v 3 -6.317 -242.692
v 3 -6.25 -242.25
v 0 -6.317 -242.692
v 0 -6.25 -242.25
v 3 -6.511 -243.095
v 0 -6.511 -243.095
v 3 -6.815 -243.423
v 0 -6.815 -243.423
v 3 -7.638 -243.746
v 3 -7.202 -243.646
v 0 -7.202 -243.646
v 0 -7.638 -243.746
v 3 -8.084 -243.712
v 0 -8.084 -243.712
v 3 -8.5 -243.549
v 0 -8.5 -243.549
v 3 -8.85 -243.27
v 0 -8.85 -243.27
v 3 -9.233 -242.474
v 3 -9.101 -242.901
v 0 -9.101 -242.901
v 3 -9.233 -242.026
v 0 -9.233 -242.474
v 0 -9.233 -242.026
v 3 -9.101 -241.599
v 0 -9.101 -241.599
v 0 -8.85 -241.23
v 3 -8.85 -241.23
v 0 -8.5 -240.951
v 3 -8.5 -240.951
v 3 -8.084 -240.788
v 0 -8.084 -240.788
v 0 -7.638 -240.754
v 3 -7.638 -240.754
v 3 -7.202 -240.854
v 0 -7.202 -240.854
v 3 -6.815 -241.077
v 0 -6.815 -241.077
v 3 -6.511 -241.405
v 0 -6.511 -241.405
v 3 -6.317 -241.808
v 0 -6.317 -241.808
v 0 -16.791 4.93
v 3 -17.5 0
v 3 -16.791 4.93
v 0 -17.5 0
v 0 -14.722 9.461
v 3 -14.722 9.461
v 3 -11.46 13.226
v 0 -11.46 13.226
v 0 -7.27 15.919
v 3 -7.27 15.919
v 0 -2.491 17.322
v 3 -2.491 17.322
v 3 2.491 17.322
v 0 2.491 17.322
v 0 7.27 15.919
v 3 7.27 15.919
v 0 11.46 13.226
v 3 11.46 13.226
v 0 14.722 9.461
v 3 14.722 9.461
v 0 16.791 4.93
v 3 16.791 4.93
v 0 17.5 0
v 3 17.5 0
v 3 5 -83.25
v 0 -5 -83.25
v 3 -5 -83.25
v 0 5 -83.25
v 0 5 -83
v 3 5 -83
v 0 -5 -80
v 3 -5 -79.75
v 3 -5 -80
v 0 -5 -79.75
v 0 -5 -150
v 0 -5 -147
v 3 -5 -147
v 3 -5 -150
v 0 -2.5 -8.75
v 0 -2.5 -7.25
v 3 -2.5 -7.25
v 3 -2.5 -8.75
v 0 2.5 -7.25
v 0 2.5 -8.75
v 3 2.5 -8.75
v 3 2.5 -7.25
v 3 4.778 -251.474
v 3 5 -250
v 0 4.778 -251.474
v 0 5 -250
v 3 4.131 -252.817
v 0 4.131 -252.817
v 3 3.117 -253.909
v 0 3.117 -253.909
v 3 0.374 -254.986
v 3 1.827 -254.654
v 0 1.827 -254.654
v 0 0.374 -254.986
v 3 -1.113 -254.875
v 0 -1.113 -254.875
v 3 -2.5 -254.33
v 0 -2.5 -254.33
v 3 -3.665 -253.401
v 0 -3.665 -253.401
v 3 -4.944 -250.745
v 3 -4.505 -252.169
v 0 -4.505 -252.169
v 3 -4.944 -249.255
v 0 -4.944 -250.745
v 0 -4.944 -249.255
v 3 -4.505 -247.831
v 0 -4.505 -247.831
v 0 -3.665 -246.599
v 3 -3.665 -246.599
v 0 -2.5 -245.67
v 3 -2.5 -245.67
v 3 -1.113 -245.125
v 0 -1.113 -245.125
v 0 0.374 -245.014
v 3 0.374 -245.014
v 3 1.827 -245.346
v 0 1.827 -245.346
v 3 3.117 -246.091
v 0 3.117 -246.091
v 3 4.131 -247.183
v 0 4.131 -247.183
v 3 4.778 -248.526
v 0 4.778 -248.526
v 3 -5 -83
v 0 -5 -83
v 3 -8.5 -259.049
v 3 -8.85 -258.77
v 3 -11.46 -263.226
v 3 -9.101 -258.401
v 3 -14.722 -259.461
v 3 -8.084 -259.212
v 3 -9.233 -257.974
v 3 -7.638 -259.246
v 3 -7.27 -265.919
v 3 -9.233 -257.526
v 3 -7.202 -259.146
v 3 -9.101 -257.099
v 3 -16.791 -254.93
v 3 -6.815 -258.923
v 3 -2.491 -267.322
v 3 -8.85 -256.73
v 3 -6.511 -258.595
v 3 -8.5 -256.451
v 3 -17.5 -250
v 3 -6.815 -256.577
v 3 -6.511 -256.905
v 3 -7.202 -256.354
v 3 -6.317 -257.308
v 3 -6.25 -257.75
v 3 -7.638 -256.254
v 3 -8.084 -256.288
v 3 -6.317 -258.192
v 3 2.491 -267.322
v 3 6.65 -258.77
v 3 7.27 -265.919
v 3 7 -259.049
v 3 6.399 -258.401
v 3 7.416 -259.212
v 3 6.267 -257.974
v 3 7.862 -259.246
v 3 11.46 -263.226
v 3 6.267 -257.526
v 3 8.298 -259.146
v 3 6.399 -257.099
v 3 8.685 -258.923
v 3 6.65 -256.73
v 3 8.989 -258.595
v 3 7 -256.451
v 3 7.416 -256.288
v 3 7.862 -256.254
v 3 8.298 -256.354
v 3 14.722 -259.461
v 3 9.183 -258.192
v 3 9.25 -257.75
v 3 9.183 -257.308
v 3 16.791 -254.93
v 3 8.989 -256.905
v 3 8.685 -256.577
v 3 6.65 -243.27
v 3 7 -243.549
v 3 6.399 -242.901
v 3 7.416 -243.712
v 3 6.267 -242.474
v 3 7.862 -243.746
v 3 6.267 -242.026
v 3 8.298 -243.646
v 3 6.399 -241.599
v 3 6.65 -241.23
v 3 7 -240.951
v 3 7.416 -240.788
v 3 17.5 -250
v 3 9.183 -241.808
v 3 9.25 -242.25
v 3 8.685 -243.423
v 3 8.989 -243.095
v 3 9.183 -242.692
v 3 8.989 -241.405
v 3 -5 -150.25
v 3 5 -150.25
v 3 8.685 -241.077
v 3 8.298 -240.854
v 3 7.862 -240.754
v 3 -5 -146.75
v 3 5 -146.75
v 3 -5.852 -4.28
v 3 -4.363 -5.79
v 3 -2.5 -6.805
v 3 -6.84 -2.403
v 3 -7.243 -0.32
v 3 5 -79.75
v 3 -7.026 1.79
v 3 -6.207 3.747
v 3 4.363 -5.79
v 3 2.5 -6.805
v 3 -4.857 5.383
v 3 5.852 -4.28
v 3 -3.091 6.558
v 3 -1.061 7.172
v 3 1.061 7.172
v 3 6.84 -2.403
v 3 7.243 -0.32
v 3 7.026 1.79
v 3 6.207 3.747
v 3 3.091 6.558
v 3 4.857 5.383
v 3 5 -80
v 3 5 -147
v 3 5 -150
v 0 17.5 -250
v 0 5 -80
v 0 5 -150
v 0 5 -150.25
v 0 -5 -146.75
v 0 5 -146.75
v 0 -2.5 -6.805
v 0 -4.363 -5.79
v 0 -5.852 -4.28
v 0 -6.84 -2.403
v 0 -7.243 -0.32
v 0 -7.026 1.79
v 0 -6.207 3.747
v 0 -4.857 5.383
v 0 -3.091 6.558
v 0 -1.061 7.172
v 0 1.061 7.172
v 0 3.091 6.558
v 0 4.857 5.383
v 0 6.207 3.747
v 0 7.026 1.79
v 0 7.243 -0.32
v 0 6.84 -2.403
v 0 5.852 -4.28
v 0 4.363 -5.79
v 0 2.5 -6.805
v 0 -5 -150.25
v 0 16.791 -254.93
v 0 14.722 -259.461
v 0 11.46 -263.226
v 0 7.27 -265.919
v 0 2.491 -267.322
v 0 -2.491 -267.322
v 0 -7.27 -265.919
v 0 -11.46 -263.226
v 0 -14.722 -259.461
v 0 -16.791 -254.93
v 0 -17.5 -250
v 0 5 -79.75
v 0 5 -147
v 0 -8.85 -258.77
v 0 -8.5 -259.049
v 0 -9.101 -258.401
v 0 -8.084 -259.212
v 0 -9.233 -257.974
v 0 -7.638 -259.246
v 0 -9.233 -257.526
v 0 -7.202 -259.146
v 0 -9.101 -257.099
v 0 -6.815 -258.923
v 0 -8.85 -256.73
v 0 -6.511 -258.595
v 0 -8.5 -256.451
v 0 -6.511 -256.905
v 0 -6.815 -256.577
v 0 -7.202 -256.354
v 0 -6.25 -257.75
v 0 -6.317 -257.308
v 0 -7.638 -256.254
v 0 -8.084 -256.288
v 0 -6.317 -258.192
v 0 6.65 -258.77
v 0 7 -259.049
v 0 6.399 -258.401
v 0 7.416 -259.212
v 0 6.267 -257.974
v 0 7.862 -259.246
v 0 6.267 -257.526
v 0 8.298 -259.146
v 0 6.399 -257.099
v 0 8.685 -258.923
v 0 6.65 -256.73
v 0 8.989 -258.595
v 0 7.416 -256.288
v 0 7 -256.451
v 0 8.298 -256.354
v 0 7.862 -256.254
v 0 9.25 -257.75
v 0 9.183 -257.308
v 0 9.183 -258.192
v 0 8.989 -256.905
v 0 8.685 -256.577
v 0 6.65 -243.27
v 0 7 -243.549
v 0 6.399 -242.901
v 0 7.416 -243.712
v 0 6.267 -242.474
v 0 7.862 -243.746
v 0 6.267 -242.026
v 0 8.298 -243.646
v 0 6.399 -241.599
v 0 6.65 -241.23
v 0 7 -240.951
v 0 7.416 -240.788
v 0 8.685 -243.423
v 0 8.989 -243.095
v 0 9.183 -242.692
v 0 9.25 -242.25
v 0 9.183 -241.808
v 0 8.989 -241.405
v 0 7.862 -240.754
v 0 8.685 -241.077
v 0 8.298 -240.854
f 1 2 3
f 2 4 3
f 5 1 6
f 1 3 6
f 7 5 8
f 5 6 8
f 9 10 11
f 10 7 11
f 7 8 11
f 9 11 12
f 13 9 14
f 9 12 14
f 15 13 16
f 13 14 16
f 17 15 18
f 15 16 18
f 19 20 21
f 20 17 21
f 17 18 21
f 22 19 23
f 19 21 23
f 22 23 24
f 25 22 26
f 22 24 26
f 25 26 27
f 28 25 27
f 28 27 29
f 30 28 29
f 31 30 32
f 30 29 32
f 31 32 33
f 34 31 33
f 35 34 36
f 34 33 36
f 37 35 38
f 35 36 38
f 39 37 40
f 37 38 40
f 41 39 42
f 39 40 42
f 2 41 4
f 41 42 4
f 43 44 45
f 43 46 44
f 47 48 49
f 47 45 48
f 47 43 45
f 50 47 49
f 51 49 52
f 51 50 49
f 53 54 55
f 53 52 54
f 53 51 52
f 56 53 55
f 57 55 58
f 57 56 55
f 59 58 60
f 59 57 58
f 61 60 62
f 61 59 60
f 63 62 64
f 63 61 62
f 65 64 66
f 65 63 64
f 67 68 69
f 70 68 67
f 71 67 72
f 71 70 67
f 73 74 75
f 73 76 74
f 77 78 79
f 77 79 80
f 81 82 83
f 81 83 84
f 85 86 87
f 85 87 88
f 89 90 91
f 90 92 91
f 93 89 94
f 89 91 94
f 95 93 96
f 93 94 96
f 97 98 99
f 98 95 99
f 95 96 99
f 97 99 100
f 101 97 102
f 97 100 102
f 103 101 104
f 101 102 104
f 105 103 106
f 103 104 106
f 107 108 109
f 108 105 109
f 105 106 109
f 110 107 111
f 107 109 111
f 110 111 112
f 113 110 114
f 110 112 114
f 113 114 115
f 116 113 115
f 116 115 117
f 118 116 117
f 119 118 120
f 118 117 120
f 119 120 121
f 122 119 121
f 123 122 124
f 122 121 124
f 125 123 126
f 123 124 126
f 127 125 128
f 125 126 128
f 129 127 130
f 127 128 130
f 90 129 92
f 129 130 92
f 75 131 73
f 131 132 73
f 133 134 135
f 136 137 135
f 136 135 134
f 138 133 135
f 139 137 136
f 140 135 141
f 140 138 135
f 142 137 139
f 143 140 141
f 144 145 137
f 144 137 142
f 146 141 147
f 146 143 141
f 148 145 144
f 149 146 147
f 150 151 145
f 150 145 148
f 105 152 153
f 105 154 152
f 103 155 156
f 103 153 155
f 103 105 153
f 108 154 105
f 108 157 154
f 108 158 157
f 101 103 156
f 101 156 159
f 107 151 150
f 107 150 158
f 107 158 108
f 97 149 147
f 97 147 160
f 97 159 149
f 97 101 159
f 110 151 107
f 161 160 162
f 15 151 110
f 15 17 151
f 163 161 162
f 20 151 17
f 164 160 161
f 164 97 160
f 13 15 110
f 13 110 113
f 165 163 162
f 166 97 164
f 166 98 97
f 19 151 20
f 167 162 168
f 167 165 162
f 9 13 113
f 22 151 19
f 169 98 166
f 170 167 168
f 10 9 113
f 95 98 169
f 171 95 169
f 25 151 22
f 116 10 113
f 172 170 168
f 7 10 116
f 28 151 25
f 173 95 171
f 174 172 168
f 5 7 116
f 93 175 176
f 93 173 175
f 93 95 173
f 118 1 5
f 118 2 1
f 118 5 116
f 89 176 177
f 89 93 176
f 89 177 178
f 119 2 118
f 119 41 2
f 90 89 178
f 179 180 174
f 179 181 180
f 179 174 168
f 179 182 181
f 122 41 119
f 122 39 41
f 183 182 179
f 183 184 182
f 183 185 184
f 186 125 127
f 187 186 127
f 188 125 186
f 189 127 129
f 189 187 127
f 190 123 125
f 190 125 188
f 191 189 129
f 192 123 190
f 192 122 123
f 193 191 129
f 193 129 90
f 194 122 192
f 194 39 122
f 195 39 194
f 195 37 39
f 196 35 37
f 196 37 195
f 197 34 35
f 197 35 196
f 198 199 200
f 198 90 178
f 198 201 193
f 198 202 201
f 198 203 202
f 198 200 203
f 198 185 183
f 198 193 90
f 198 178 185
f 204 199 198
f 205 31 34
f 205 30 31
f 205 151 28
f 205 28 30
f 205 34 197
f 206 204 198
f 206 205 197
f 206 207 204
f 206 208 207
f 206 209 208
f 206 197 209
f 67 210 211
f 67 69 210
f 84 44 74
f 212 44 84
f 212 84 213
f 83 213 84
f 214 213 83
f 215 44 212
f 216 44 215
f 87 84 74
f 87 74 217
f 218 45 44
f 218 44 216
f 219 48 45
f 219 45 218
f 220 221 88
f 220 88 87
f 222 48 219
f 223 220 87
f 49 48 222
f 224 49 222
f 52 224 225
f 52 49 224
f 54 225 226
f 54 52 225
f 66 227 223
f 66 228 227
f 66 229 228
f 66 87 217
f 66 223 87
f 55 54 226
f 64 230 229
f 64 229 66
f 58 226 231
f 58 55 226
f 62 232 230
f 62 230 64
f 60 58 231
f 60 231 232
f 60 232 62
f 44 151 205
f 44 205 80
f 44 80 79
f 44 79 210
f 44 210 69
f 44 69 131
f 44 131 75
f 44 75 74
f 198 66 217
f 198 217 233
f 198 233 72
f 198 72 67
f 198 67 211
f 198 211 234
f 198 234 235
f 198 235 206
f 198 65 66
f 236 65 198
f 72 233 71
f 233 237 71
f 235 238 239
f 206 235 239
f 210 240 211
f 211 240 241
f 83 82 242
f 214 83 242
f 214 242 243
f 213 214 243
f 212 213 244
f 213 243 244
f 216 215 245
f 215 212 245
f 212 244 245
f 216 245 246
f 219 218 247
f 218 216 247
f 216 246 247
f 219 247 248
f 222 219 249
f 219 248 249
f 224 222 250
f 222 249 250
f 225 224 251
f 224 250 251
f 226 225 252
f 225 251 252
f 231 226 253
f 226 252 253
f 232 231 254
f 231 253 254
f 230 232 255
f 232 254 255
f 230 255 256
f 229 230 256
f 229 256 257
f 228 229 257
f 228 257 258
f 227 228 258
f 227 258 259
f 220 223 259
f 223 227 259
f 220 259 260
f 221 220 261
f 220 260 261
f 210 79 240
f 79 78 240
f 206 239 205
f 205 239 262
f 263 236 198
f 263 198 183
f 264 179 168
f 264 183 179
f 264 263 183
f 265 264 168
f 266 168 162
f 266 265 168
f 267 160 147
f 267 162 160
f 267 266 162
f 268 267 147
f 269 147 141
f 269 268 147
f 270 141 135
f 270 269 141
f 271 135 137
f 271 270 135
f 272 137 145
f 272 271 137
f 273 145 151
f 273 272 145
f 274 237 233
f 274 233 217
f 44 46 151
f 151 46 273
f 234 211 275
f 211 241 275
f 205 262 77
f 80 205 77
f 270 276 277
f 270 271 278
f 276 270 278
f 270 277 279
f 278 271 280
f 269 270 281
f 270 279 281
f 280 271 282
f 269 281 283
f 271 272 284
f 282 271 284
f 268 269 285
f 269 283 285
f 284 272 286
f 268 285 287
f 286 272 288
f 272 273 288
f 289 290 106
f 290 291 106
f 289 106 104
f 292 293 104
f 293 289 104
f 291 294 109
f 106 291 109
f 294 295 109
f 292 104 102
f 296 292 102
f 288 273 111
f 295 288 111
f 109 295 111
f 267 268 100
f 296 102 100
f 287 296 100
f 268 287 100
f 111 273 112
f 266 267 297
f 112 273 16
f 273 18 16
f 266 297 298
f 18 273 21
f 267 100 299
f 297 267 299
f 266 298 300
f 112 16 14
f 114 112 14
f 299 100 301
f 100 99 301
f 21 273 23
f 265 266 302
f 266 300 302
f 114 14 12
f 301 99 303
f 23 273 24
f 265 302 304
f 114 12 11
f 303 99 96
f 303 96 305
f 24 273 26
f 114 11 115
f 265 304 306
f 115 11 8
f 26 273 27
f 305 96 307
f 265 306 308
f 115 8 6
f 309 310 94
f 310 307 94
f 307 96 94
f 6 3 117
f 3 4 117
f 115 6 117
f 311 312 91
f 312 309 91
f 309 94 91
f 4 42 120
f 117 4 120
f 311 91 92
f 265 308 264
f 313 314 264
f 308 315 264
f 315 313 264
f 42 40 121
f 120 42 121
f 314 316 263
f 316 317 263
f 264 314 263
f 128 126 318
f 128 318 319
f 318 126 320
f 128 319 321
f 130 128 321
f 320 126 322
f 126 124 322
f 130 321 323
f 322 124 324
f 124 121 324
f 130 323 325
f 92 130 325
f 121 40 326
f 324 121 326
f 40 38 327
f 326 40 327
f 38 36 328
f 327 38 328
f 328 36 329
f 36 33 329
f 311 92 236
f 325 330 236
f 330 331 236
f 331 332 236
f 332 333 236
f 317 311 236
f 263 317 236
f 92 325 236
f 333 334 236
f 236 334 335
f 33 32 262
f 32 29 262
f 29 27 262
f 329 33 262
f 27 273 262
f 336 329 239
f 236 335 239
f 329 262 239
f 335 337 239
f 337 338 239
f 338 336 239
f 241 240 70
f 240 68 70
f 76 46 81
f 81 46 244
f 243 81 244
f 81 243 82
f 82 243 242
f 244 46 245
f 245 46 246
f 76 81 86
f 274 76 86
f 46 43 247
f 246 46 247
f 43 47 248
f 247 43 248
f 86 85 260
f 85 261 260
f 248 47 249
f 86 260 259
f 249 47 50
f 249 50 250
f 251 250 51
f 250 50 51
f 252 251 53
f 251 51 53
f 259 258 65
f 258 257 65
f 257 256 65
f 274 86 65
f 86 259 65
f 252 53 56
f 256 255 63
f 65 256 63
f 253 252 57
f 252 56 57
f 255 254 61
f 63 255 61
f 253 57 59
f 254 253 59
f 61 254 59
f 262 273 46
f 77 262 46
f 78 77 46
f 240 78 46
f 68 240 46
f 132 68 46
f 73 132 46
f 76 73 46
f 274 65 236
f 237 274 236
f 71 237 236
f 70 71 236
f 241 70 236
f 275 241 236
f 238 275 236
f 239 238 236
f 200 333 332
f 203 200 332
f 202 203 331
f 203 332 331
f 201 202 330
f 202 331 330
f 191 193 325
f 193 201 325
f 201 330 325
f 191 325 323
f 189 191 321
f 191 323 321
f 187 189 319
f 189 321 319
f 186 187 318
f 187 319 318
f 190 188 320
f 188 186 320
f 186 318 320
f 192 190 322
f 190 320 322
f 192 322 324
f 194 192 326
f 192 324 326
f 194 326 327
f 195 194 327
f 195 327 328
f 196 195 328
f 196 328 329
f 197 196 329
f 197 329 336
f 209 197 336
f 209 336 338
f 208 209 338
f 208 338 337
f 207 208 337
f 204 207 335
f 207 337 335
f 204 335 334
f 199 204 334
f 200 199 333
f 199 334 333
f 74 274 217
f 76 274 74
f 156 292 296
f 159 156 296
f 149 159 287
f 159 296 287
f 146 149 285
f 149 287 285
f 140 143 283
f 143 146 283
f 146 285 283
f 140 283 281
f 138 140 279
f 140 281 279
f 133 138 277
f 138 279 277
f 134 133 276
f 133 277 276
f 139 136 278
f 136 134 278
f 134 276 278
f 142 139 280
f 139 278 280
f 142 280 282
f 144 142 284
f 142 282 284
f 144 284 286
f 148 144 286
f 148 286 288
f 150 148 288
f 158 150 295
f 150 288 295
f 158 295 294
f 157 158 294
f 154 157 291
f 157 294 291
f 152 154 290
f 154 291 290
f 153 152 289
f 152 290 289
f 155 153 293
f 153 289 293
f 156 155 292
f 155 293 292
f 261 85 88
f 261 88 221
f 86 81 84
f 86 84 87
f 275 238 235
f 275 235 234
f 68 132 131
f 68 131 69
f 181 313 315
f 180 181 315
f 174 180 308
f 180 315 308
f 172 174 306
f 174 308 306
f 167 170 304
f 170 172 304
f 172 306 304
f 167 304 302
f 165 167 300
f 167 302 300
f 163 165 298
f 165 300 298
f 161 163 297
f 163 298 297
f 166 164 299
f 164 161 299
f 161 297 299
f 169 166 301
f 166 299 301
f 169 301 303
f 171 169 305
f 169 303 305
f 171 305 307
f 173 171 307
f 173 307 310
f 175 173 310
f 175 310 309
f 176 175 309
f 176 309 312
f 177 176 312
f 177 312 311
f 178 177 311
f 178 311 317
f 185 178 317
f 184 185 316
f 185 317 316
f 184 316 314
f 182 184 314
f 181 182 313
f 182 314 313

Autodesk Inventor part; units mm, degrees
ref_plane "YZ Plane" through (0, 0, 0) normal (1, 0, 0) x (0, 1, 0)
ref_plane "XZ Plane" through (0, 0, 0) normal (0, 1, 0) x (-1, 0, 0)
ref_plane "XY Plane" through (0, 0, 0) normal (0, 0, 1) x (1, 0, 0)
sketch "Sketch1" plane through (0, 0, 0) normal (1, 0, 0) x (0, 1, 0)
  line L0 (0, 0) -> (0, -250) construction
  circle A0 centre (0, -250) radius 5
  arc A1 (0, -17.5) -> (17.5, 0) centre (0, 0) ccw construction
  arc A2 (0, -232.5) -> (-17.5, -250) centre (0, -250) ccw construction
  line L1 (17.5, 0) -> (17.5, -250)
  line L2 (-17.5, 0) -> (-17.5, -250)
  arc A3 (-17.5, 0) -> (0, -17.5) centre (0, 0) ccw construction
  arc A4 (17.5, 0) -> (-17.5, 0) centre (0, 0) ccw
  arc A5 (17.5, -250) -> (0, -232.5) centre (0, -250) ccw construction
  arc A6 (-17.5, -250) -> (17.5, -250) centre (0, -250) ccw
  line L3 (0, 0) -> (0, -80) construction
  line L4 (0, -80) -> (5, -80) construction
  line L5 (5, -80) -> (5, -83)
  line L6 (5, -83) -> (-5, -83) construction
  line L7 (-5, -83) -> (-5, -80)
  line L8 (-5, -80) -> (0, -80) construction
  line L9 (0, -250) -> (0, -150) construction
  line L10 (0, -150) -> (5, -150) construction
  line L11 (5, -150) -> (5, -147)
  line L12 (5, -147) -> (-5, -147) construction
  line L13 (-5, -147) -> (-5, -150)
  line L14 (0, -150) -> (-5, -150) construction
  line L15 (7.5, 0) -> (7.5, -6) construction
  arc A7 (0, -7.25) -> (2.5, -6.8053) centre (0, 0) ccw construction
  line L16 (0, -7.25) -> (2.5, -7.25) construction
  line L17 (2.5, -7.25) -> (-2.5, -7.25) construction
  line L18 (-2.5, -7.25) -> (-2.5, -8.75)
  line L19 (-2.5, -8.75) -> (2.5, -8.75)
  line L20 (2.5, -8.75) -> (2.5, -7.25)
  line L21 (2.5, -7.25) -> (2.5, -6.8053)
  line L22 (-2.5, -7.25) -> (-2.5, -6.8053)
  arc A8 (-2.5, -6.8053) -> (0, -7.25) centre (0, 0) ccw construction
  arc A9 (2.5, -6.8053) -> (-2.5, -6.8053) centre (0, 0) ccw
  line L23 (0, -250) -> (7.75, -250) construction
  line L24 (7.75, -250) -> (7.75, -257.75) construction
  line L25 (7.75, -257.75) -> (0, -257.75) construction
  line L26 (0, -257.75) -> (0, -250) construction
  line L27 (7.75, -257.75) -> (-7.75, -257.75) construction
  line L28 (-7.75, -257.75) -> (-7.75, -242.25) construction
  line L29 (-7.75, -242.25) -> (7.75, -242.25) construction
  line L30 (7.75, -242.25) -> (7.75, -257.75) construction
  circle A10 centre (7.75, -242.25) radius 1.5
  circle A11 centre (7.75, -257.75) radius 1.5
  circle A12 centre (-7.75, -257.75) radius 1.5
  circle A13 centre (-7.75, -242.25) radius 1.5
  line L31 (5, -80) -> (5, -79.75)
  line L32 (5, -79.75) -> (-5, -79.75)
  line L33 (-5, -79.75) -> (-5, -80)
  line L34 (-5, -83) -> (-5, -83.25)
  line L35 (-5, -83.25) -> (5, -83.25)
  line L36 (5, -83.25) -> (5, -83)
  line L37 (-5, -147) -> (-5, -146.75)
  line L38 (-5, -146.75) -> (5, -146.75)
  line L39 (5, -146.75) -> (5, -147)
  line L40 (5, -150) -> (5, -150.25)
  line L41 (5, -150.25) -> (-5, -150.25)
  line L42 (-5, -150.25) -> (-5, -150)
  dimension "d1" = 250
  dimension "d2" = 10
  dimension "d3" = 35
  dimension "d4" = 35
  dimension "d5" = 80
  dimension "d6" = 5
  dimension "d7" = 3
  dimension "d9" = 100
  dimension "d10" = 3
  dimension "d14" = 10
  dimension "d27" = 2.5
  dimension "d28" = 5
  dimension "d29" = 1.5
  dimension "d30" = 7.25
  dimension "d31" = 7.75
  dimension "d32" = 7.75
  dimension "d33" = 15.5
  dimension "d34" = 15.5
  dimension "d35" = 3
  dimension "d36" = 3
  dimension "d37" = 3
  dimension "d38" = 3
  dimension "d39" = 64
  dimension "d40" = 0.25
  dimension "d41" = 10
  dimension "d42" = 0.25
  dimension "d43" = 0.25
  dimension "d44" = 10
  dimension "d45" = 0.25
  dimension "d46" = 0.25
  dimension "d47" = 10
  dimension "d48" = 0.25
  dimension "d49" = 0.25
  dimension "d50" = 10
  dimension "d51" = 0.25
extrude "Extrusion1" add sketch "Sketch1" along normal blind 3
properties part number "brazo1" material "PMMA Plastic"
